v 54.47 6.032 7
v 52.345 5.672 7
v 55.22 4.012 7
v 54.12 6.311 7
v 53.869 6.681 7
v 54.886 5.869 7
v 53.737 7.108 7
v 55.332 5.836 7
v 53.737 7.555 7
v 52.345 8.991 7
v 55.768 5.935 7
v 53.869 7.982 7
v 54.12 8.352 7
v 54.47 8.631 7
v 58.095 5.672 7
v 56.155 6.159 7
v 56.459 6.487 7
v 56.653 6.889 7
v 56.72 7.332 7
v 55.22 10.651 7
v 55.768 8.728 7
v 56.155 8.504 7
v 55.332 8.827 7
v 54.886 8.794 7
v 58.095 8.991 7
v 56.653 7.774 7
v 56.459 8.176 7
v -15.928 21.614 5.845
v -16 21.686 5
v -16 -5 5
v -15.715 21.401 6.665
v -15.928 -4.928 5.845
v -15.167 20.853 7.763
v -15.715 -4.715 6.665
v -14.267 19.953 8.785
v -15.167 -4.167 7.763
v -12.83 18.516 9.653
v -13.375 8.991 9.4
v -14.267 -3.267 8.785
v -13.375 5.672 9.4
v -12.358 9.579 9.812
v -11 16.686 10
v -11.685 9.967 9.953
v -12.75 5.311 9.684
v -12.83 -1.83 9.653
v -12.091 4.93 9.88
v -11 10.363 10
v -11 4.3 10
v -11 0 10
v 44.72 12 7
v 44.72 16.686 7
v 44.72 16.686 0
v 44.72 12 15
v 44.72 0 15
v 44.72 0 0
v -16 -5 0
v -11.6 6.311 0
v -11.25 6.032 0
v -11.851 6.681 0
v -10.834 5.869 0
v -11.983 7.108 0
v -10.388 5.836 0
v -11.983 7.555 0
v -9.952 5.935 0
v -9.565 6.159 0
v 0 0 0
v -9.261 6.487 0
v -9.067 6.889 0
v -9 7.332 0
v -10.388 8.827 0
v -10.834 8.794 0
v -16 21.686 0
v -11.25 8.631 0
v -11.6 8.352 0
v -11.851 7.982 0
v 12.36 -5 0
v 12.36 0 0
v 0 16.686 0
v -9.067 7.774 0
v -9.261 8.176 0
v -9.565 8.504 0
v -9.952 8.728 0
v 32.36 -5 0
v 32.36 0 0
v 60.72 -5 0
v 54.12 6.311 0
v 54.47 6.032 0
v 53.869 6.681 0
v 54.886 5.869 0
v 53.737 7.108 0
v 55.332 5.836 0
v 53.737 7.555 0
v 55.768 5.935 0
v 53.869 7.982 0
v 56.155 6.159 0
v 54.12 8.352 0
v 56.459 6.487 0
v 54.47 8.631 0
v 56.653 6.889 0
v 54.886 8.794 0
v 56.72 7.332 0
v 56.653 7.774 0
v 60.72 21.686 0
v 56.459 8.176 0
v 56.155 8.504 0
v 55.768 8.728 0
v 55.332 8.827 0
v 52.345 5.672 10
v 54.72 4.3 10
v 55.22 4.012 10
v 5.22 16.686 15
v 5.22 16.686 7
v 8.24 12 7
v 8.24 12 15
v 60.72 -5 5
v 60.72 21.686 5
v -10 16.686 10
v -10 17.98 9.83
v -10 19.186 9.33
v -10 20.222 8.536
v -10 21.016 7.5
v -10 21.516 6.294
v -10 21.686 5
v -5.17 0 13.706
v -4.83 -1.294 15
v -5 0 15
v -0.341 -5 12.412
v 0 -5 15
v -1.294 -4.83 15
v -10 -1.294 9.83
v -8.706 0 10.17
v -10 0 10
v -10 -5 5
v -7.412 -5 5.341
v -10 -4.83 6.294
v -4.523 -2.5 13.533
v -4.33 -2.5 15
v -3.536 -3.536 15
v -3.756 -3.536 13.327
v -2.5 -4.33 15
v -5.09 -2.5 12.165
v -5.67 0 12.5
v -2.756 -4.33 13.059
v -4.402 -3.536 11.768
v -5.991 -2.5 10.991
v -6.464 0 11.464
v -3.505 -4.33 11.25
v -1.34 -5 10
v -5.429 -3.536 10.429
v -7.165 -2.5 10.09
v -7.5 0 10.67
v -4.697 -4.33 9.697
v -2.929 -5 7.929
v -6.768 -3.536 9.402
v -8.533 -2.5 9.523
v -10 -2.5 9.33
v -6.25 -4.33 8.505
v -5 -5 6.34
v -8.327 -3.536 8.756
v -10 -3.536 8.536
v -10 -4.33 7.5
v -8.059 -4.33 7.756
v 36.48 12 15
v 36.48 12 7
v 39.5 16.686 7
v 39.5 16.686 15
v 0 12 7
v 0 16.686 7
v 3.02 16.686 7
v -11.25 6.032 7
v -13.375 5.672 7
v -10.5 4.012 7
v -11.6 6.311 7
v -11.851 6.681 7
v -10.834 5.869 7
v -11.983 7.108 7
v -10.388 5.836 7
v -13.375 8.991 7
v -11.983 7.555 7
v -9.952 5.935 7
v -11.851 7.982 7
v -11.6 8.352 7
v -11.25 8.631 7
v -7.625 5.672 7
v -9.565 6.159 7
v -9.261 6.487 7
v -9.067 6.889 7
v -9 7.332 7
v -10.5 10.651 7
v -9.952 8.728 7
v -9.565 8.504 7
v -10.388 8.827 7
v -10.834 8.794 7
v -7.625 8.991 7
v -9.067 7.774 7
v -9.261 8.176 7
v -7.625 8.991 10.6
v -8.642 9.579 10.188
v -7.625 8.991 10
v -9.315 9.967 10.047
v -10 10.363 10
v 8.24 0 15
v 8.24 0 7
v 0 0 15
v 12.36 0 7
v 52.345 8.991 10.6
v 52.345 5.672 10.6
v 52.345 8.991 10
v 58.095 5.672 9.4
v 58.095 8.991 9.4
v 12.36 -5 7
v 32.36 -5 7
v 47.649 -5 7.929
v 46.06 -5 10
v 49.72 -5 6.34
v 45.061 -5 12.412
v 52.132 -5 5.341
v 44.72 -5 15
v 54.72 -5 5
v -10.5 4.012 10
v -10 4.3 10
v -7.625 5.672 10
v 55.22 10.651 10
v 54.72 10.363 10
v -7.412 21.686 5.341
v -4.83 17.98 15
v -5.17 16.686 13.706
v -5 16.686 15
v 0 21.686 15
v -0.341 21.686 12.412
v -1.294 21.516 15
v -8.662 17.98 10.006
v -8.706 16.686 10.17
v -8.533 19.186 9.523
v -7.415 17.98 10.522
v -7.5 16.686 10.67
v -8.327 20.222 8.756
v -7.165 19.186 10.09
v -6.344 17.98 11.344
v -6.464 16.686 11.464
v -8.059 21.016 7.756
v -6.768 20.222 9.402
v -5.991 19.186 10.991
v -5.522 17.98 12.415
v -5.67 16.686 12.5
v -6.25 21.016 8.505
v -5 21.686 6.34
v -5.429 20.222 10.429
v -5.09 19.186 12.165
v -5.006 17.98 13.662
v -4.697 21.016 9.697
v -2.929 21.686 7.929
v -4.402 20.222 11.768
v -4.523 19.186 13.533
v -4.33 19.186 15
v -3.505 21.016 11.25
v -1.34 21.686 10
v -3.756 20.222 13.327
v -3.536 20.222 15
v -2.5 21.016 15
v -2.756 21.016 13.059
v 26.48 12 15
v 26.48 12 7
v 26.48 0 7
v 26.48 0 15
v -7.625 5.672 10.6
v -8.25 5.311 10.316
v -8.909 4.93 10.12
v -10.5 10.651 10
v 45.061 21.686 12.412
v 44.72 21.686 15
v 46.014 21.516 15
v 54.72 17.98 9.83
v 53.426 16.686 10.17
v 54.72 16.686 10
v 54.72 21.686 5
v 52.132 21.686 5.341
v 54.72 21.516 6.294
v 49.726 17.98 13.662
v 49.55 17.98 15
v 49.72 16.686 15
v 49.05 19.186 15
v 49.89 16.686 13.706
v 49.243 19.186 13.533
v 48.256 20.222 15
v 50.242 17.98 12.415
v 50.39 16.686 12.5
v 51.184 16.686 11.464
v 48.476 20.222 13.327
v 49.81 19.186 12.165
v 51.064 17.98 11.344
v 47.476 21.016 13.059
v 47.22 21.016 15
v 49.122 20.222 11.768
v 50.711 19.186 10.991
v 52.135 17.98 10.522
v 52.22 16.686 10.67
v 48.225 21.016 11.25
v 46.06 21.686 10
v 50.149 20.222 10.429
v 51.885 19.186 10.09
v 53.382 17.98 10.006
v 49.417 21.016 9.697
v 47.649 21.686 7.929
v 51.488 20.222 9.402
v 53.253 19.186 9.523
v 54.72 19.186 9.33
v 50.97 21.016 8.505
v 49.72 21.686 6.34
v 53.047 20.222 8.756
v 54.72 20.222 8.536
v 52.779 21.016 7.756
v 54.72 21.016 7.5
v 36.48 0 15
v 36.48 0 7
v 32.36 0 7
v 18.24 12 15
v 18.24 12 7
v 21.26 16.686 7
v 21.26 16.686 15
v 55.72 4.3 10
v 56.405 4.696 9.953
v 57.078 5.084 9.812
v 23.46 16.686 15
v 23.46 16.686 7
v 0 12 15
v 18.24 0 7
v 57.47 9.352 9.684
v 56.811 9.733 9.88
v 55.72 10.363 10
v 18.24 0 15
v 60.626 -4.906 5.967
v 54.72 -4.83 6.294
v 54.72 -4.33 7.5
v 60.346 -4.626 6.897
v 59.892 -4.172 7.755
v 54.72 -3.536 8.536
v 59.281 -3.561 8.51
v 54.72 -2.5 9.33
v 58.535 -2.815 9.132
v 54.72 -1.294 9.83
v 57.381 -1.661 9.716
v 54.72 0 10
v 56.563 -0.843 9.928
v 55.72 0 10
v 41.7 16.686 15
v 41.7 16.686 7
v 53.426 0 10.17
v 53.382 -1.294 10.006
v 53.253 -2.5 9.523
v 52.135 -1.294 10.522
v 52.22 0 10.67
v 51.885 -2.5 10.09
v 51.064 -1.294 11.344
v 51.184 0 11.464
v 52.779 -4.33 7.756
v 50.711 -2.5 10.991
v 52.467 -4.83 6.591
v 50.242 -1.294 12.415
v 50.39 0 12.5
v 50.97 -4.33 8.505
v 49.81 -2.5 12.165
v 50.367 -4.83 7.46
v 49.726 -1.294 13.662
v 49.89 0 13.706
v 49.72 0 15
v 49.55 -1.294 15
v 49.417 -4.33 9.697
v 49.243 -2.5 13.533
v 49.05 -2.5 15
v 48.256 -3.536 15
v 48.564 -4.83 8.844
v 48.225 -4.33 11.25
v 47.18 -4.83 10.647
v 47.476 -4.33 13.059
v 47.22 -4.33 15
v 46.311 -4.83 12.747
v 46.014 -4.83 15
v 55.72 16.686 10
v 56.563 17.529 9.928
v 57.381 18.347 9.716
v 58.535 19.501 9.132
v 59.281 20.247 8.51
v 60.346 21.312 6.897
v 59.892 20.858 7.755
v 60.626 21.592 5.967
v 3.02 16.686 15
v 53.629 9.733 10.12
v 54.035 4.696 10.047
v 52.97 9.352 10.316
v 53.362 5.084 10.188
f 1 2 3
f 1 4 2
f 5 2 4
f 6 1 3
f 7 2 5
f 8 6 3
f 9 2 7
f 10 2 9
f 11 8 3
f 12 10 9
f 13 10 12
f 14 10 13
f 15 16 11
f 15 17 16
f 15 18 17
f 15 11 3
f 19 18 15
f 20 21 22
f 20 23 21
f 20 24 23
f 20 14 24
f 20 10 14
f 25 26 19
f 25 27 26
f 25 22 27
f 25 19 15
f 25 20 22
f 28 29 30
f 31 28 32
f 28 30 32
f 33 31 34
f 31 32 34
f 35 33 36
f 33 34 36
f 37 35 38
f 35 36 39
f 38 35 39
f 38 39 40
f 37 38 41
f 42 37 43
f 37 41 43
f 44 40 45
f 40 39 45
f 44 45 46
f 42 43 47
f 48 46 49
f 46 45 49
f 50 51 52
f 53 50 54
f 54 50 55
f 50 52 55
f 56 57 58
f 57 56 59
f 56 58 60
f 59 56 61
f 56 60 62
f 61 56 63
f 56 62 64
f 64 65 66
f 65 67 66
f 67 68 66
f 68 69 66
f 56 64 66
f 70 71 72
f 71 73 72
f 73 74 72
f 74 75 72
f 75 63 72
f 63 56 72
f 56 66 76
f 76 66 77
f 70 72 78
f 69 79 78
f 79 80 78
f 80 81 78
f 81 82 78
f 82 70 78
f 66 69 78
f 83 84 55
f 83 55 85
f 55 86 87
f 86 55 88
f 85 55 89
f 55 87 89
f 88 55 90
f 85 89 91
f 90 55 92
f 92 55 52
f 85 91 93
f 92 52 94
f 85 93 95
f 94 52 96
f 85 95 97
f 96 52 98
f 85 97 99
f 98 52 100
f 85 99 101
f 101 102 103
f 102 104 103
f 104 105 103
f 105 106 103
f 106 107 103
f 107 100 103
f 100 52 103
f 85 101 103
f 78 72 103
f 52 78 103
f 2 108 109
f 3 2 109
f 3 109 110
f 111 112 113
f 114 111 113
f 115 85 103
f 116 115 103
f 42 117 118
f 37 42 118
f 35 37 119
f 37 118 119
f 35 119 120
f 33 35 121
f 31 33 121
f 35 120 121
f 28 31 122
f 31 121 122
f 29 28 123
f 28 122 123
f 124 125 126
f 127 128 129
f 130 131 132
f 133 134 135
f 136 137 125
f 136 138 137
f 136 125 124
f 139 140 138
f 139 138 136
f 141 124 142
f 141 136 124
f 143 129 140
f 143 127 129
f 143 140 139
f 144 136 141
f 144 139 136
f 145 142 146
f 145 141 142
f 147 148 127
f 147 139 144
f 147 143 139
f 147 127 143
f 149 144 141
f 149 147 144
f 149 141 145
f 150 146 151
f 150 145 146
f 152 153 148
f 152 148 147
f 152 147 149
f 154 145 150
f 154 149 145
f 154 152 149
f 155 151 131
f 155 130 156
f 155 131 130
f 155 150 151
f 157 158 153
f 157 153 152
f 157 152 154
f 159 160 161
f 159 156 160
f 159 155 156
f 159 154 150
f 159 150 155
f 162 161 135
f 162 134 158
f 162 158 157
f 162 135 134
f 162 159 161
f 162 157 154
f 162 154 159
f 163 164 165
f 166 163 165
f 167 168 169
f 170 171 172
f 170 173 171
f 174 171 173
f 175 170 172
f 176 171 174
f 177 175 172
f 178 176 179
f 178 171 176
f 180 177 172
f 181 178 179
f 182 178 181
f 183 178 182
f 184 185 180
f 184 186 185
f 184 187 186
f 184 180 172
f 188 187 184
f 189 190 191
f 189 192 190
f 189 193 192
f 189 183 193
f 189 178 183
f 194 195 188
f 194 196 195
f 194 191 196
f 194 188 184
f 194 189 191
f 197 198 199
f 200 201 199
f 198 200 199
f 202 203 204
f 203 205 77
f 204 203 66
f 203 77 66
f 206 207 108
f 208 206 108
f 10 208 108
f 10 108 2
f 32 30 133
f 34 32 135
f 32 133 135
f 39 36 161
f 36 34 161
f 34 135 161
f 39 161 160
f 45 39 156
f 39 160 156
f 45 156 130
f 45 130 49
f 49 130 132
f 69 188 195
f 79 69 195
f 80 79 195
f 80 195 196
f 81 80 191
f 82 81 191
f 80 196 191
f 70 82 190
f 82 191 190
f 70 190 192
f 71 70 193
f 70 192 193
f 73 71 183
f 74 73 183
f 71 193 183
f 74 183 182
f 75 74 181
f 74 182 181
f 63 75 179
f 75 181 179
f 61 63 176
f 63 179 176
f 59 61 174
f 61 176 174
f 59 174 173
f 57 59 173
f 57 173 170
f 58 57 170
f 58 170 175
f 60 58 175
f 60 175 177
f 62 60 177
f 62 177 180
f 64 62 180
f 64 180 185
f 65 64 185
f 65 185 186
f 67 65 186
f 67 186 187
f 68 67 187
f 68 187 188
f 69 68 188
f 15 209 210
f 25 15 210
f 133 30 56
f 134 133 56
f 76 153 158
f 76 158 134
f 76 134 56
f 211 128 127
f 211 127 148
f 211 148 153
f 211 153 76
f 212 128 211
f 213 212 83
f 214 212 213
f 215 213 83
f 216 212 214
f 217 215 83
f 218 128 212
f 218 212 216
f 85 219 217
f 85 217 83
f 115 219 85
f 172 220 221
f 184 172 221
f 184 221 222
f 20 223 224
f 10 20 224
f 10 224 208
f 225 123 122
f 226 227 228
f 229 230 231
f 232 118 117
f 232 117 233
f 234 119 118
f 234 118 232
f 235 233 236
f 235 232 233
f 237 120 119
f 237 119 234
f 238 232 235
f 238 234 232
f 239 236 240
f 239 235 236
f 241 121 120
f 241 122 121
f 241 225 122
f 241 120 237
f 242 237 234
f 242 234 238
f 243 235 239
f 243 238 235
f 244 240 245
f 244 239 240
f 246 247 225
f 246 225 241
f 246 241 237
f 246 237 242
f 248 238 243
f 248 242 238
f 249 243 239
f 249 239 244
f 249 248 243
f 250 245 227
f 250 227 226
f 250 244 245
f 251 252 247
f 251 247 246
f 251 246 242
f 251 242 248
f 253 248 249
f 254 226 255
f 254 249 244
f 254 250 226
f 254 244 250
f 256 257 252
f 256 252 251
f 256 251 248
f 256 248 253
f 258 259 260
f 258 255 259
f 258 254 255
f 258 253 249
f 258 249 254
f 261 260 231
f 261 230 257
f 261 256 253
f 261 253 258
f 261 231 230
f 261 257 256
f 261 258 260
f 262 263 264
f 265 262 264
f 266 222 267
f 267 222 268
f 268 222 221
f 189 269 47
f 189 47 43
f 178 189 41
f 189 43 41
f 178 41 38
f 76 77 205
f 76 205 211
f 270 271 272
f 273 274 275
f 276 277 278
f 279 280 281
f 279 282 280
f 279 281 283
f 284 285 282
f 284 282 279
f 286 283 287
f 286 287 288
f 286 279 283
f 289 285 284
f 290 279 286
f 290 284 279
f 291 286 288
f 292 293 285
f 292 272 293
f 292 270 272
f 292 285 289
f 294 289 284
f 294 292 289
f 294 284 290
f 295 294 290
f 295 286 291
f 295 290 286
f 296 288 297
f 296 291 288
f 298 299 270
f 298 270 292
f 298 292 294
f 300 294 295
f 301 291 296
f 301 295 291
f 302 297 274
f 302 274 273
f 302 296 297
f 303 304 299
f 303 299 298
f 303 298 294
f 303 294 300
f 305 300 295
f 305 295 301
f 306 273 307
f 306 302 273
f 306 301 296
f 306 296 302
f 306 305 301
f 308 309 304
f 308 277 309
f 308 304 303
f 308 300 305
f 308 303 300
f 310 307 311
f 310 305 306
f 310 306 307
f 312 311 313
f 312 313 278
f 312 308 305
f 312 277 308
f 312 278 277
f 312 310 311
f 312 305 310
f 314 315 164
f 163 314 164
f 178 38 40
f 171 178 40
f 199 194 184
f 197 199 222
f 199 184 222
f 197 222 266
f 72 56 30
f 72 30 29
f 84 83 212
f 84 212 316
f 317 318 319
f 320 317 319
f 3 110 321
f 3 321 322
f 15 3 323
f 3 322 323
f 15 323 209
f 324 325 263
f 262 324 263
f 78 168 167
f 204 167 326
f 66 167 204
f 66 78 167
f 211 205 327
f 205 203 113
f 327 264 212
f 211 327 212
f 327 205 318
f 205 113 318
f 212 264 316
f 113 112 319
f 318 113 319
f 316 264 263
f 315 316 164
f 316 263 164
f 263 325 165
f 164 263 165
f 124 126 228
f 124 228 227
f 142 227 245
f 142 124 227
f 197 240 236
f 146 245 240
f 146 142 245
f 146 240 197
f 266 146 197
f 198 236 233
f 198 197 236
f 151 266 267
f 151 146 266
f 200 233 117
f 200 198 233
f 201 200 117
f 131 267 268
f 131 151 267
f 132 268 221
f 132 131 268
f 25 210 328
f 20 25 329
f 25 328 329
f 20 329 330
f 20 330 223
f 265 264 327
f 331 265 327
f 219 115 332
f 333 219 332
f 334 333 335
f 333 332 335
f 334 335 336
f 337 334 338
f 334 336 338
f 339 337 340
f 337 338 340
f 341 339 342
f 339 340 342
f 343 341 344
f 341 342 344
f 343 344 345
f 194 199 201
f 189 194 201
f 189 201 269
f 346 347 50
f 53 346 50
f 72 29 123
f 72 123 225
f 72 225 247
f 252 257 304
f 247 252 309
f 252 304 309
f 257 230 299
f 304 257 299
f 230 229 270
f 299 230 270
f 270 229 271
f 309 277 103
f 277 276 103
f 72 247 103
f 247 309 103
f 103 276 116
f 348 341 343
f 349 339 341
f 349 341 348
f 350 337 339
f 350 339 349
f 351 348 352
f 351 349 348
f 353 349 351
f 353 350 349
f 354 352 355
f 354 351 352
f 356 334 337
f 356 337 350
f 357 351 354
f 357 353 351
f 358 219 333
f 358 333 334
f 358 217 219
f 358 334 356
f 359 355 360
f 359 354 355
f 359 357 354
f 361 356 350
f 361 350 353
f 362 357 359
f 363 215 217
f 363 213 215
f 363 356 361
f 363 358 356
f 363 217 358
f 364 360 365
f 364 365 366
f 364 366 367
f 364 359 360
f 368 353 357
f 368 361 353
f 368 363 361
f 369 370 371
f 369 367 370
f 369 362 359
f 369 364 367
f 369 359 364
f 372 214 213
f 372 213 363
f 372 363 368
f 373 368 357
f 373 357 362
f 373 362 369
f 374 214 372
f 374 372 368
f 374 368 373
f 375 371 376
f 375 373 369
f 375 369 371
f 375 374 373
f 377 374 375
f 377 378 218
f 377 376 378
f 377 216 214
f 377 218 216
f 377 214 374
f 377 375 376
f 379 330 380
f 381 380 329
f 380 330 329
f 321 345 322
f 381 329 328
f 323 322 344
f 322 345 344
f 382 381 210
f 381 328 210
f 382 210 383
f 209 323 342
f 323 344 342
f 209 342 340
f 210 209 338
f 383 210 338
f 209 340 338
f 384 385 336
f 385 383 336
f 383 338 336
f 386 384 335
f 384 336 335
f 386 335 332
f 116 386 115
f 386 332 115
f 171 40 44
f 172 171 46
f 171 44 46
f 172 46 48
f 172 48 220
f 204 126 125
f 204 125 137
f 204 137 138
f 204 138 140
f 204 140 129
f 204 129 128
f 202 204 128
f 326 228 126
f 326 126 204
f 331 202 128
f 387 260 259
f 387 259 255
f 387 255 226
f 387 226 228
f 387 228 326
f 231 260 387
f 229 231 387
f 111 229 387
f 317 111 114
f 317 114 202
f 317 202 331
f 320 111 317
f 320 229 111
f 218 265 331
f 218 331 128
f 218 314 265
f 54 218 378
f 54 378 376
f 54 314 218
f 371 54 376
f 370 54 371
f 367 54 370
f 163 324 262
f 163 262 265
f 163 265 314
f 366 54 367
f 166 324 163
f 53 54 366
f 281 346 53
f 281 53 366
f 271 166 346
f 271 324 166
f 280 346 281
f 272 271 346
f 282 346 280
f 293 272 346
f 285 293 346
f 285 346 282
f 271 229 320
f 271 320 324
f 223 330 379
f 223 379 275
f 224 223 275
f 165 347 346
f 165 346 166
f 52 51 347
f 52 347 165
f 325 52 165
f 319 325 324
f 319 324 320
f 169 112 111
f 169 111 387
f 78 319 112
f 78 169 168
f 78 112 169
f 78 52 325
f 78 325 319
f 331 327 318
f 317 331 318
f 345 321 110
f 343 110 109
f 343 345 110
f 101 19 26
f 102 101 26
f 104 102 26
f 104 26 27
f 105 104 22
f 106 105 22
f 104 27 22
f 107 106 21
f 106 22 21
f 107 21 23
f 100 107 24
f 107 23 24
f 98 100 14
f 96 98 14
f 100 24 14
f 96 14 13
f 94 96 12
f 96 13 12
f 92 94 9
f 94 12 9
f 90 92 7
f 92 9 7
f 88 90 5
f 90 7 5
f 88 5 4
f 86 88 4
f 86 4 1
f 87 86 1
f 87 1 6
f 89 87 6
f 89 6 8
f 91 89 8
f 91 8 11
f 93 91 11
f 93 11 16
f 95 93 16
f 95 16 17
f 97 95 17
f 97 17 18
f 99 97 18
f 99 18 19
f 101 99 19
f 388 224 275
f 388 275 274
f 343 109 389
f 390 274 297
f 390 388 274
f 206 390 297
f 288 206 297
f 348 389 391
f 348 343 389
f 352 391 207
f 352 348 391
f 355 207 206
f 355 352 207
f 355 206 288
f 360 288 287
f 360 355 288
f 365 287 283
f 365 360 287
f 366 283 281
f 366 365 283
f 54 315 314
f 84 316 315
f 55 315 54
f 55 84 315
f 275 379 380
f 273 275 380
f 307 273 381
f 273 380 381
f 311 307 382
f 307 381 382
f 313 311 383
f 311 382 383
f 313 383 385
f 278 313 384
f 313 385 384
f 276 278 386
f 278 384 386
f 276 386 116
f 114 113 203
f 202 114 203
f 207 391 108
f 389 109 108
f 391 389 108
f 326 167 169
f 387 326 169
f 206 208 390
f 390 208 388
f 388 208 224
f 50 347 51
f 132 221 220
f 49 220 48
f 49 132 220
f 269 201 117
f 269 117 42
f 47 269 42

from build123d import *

# Parameters (mm, degrees)
SKETCH1_W           = 76.72
SKETCH1_H           = 26.686
BOSS_EXTRUDE1_DEPTH = 15
SKETCH2_W           = 11
SKETCH2_H           = 5
CUT_EXTRUDE1_DEPTH  = 69.000448499
SKETCH3_R           = 1.5
CUT_EXTRUDE2_DEPTH  = 25
CUT_EXTRUDE3_DEPTH  = 3
CUT_EXTRUDE5_DEPTH  = 7
FILLET1_R           = 5


with BuildPart() as part:
    # Sketch1 → Boss-Extrude1 (new body)
    with BuildSketch(Plane.XY):
        with Locations((22.36, 8.343)):
            Rectangle(SKETCH1_W, SKETCH1_H)
        Polygon((0, 0), (0, 12), (3.02, 16.686), (5.22, 16.686), (8.24, 12), (8.24, 0), align=None, mode=Mode.SUBTRACT)
        Polygon((23.46, 16.686), (26.48, 12), (26.48, 0), (18.24, 0), (18.24, 12), (21.26, 16.686), align=None, mode=Mode.SUBTRACT)
        Polygon((41.7, 16.686), (44.72, 12), (44.72, 0), (36.48, 0), (36.48, 12), (39.5, 16.686), align=None, mode=Mode.SUBTRACT)
    extrude(amount=BOSS_EXTRUDE1_DEPTH)

    # Sketch2 → Cut-Extrude1 (cut, through all)
    with BuildSketch(Plane(origin=(0, -5, 0), x_dir=(-1, 0, 0), z_dir=(0, -1, 0))):
        with Locations((10.5, -12.5)):
            Rectangle(SKETCH2_W, SKETCH2_H)
        with Locations((-55.22, -12.5)):
            Rectangle(SKETCH2_W, SKETCH2_H)
    extrude(amount=-CUT_EXTRUDE1_DEPTH, mode=Mode.SUBTRACT)

    # Sketch3 → Cut-Extrude2 (cut)
    with BuildSketch(Plane.XY.offset(10)):
        with Locations((-10.5, 7.331502285)):
            Circle(SKETCH3_R)
        with Locations((55.22, 7.331502285)):
            Circle(SKETCH3_R)
    extrude(amount=-CUT_EXTRUDE2_DEPTH, mode=Mode.SUBTRACT)

    # Sketch4 → Cut-Extrude3 (cut)
    with BuildSketch(Plane.XY.offset(10)):
        Polygon((-10.5, 10.651266332), (-13.375, 8.991384309), (-13.375, 5.671620261), (-10.5, 4.011738237), (-7.625, 5.671620261), (-7.625, 8.991384309), align=None)
        Polygon((55.22, 10.651266332), (52.345, 8.991384309), (52.345, 5.671620261), (55.22, 4.011738237), (58.095, 5.671620261), (58.095, 8.991384309), align=None)
    extrude(amount=-CUT_EXTRUDE3_DEPTH, mode=Mode.SUBTRACT)

    # Sketch7 → Cut-Extrude5 (cut)
    with BuildSketch(Plane(origin=(0, 0, 0), x_dir=(-1, 0, 0), z_dir=(0, 0, -1))):
        Polygon((0, 0), (-12.36, 0), (-12.36, -5), (-32.36, -5), (-32.36, 0), (-44.72, 0), (-44.72, 16.686), (0, 16.686), align=None)
    extrude(amount=-CUT_EXTRUDE5_DEPTH, mode=Mode.SUBTRACT)

    # Fillet1
    # the kernel refuses this fillet: 5 mm, written as the material it adds along each edge
    with BuildSketch(Plane(origin=(49.72, -5, 10), x_dir=(0, 0, 1), z_dir=(0, 1, 0))) as fillet1_piece_1_section:
        with BuildLine():
            CenterArc((FILLET1_R, FILLET1_R), FILLET1_R, 180, 90)
            Line((0, FILLET1_R), (0, 0))
            Line((0, 0), (FILLET1_R, 0))
        make_face()
    fillet1_piece_1 = extrude(amount=26.686, mode=Mode.PRIVATE)
    fillet1_piece_1 = split(fillet1_piece_1, bisect_by=Plane(origin=(52.345, 0.855809372, 11.280904263), z_dir=(-1, 0, 0)), keep=Keep.TOP, mode=Mode.PRIVATE)
    fillet1_piece_1 = split(fillet1_piece_1, bisect_by=Plane(origin=(53.079309625, 5.247666401, 11.280904263), z_dir=(-0.5000000000000012, -0.866025403784438, 0)), keep=Keep.TOP, mode=Mode.PRIVATE)
    add(fillet1_piece_1)
    with BuildSketch(Plane(origin=(49.72, -5, 10), x_dir=(0, 0, 1), z_dir=(0, 1, 0))) as fillet1_piece_2_section:
        with BuildLine():
            CenterArc((FILLET1_R, FILLET1_R), FILLET1_R, 180, 90)
            Line((0, FILLET1_R), (0, 0))
            Line((0, 0), (FILLET1_R, 0))
        make_face()
    fillet1_piece_2 = extrude(amount=26.686, mode=Mode.PRIVATE)
    fillet1_piece_2 = split(fillet1_piece_2, bisect_by=Plane(origin=(52.345, 0.113882783, 10.103766802), z_dir=(1, 0, 0)), keep=Keep.TOP, mode=Mode.PRIVATE)
    fillet1_piece_2 = split(fillet1_piece_2, bisect_by=Plane(origin=(55.328155085, 3.94929487, 10.103766802), z_dir=(-0.5000000000000012, -0.866025403784438, 0)), keep=Keep.TOP, mode=Mode.PRIVATE)
    add(fillet1_piece_2)
    with BuildSketch(Plane(origin=(49.72, -5, 10), x_dir=(0, 0, 1), z_dir=(0, 1, 0))) as fillet1_piece_3_section:
        with BuildLine():
            CenterArc((FILLET1_R, FILLET1_R), FILLET1_R, 180, 90)
            Line((0, FILLET1_R), (0, 0))
            Line((0, 0), (FILLET1_R, 0))
        make_face()
    fillet1_piece_3 = extrude(amount=26.686, mode=Mode.PRIVATE)
    fillet1_piece_3 = split(fillet1_piece_3, bisect_by=Plane(origin=(50.660222367, 8.018677488, 10.86123456), z_dir=(0.5000000000000002, -0.8660254037844386, 0)), keep=Keep.TOP, mode=Mode.PRIVATE)
    fillet1_piece_3 = split(fillet1_piece_3, bisect_by=Plane(origin=(52.345, 7.331502285, 10.86123456), z_dir=(-1, 0, 0)), keep=Keep.TOP, mode=Mode.PRIVATE)
    fillet1_piece_3 = split(fillet1_piece_3, bisect_by=Plane(origin=(50.660222367, 6.644327081, 10.86123456), z_dir=(0.5000000000000012, 0.866025403784438, 0)), keep=Keep.TOP, mode=Mode.PRIVATE)
    add(fillet1_piece_3)
    with BuildSketch(Plane(origin=(49.72, -5, 10), x_dir=(0, 0, 1), z_dir=(0, 1, 0))) as fillet1_piece_4_section:
        with BuildLine():
            CenterArc((FILLET1_R, FILLET1_R), FILLET1_R, 180, 90)
            Line((0, FILLET1_R), (0, 0))
            Line((0, 0), (FILLET1_R, 0))
        make_face()
    fillet1_piece_4 = extrude(amount=26.686, mode=Mode.PRIVATE)
    fillet1_piece_4 = split(fillet1_piece_4, bisect_by=Plane(origin=(53.520712077, 9.670181993, 11.277716929), z_dir=(-0.5000000000000002, 0.8660254037844386, 0)), keep=Keep.TOP, mode=Mode.PRIVATE)
    fillet1_piece_4 = split(fillet1_piece_4, bisect_by=Plane(origin=(52.345, 14.819818281, 11.277716929), z_dir=(-1, 0, 0)), keep=Keep.TOP, mode=Mode.PRIVATE)
    add(fillet1_piece_4)
    with BuildSketch(Plane(origin=(49.72, -5, 10), x_dir=(0, 0, 1), z_dir=(0, 1, 0))) as fillet1_piece_5_section:
        with BuildLine():
            CenterArc((FILLET1_R, FILLET1_R), FILLET1_R, 180, 90)
            Line((0, FILLET1_R), (0, 0))
            Line((0, 0), (FILLET1_R, 0))
        make_face()
    fillet1_piece_5 = extrude(amount=26.686, mode=Mode.PRIVATE)
    fillet1_piece_5 = split(fillet1_piece_5, bisect_by=Plane(origin=(55.769242126, 10.968371422, 10.103260702), z_dir=(-0.5000000000000002, 0.8660254037844386, 0)), keep=Keep.TOP, mode=Mode.PRIVATE)
    fillet1_piece_5 = split(fillet1_piece_5, bisect_by=Plane(origin=(52.345, 15.561640812, 10.103260702), z_dir=(1, 0, 0)), keep=Keep.TOP, mode=Mode.PRIVATE)
    add(fillet1_piece_5)
    with BuildSketch(Plane(origin=(-5, -5, 10), x_dir=(-1, 0, 0), z_dir=(0, 1, 0))) as fillet1_piece_6_section:
        with BuildLine():
            CenterArc((FILLET1_R, FILLET1_R), FILLET1_R, 180, 90)
            Line((0, FILLET1_R), (0, 0))
            Line((0, 0), (FILLET1_R, 0))
        make_face()
    fillet1_piece_6 = extrude(amount=26.686, mode=Mode.PRIVATE)
    fillet1_piece_6 = split(fillet1_piece_6, bisect_by=Plane(origin=(-10.608155085, 3.94929487, 10.103766802), z_dir=(0.5000000000000003, -0.8660254037844387, 0)), keep=Keep.TOP, mode=Mode.PRIVATE)
    fillet1_piece_6 = split(fillet1_piece_6, bisect_by=Plane(origin=(-7.625, 0.113882783, 10.103766802), z_dir=(-1, 0, 0)), keep=Keep.TOP, mode=Mode.PRIVATE)
    add(fillet1_piece_6)
    with BuildSketch(Plane(origin=(-5, -5, 10), x_dir=(-1, 0, 0), z_dir=(0, 1, 0))) as fillet1_piece_7_section:
        with BuildLine():
            CenterArc((FILLET1_R, FILLET1_R), FILLET1_R, 180, 90)
            Line((0, FILLET1_R), (0, 0))
            Line((0, 0), (FILLET1_R, 0))
        make_face()
    fillet1_piece_7 = extrude(amount=26.686, mode=Mode.PRIVATE)
    fillet1_piece_7 = split(fillet1_piece_7, bisect_by=Plane(origin=(-8.359309625, 5.247666401, 11.280904263), z_dir=(0.5000000000000003, -0.8660254037844387, 0)), keep=Keep.TOP, mode=Mode.PRIVATE)
    fillet1_piece_7 = split(fillet1_piece_7, bisect_by=Plane(origin=(-7.625, 0.855809372, 11.280904263), z_dir=(1, 0, 0)), keep=Keep.TOP, mode=Mode.PRIVATE)
    add(fillet1_piece_7)
    with BuildSketch(Plane(origin=(-5, -5, 10), x_dir=(-1, 0, 0), z_dir=(0, 1, 0))) as fillet1_piece_8_section:
        with BuildLine():
            CenterArc((FILLET1_R, FILLET1_R), FILLET1_R, 180, 90)
            Line((0, FILLET1_R), (0, 0))
            Line((0, 0), (FILLET1_R, 0))
        make_face()
    fillet1_piece_8 = extrude(amount=26.686, mode=Mode.PRIVATE)
    fillet1_piece_8 = split(fillet1_piece_8, bisect_by=Plane(origin=(-5.940222366, 6.644327081, 10.861234561), z_dir=(-0.5000000000000003, 0.8660254037844387, 0)), keep=Keep.TOP, mode=Mode.PRIVATE)
    fillet1_piece_8 = split(fillet1_piece_8, bisect_by=Plane(origin=(-7.625, 7.331502285, 10.861234561), z_dir=(1, 0, 0)), keep=Keep.TOP, mode=Mode.PRIVATE)
    fillet1_piece_8 = split(fillet1_piece_8, bisect_by=Plane(origin=(-5.940222366, 8.018677488, 10.861234561), z_dir=(-0.49999999999999967, -0.8660254037844388, 0)), keep=Keep.TOP, mode=Mode.PRIVATE)
    add(fillet1_piece_8)
    with BuildSketch(Plane(origin=(-5, -5, 10), x_dir=(-1, 0, 0), z_dir=(0, 1, 0))) as fillet1_piece_9_section:
        with BuildLine():
            CenterArc((FILLET1_R, FILLET1_R), FILLET1_R, 180, 90)
            Line((0, FILLET1_R), (0, 0))
            Line((0, 0), (FILLET1_R, 0))
        make_face()
    fillet1_piece_9 = extrude(amount=26.686, mode=Mode.PRIVATE)
    fillet1_piece_9 = split(fillet1_piece_9, bisect_by=Plane(origin=(-7.625, 15.561640812, 10.103260702), z_dir=(-1, 0, 0)), keep=Keep.TOP, mode=Mode.PRIVATE)
    fillet1_piece_9 = split(fillet1_piece_9, bisect_by=Plane(origin=(-11.049242126, 10.968371422, 10.103260702), z_dir=(0.49999999999999967, 0.8660254037844388, 0)), keep=Keep.TOP, mode=Mode.PRIVATE)
    add(fillet1_piece_9)
    with BuildSketch(Plane(origin=(-5, -5, 10), x_dir=(-1, 0, 0), z_dir=(0, 1, 0))) as fillet1_piece_10_section:
        with BuildLine():
            CenterArc((FILLET1_R, FILLET1_R), FILLET1_R, 180, 90)
            Line((0, FILLET1_R), (0, 0))
            Line((0, 0), (FILLET1_R, 0))
        make_face()
    fillet1_piece_10 = extrude(amount=26.686, mode=Mode.PRIVATE)
    fillet1_piece_10 = split(fillet1_piece_10, bisect_by=Plane(origin=(-7.625, 14.819818281, 11.277716929), z_dir=(1, 0, 0)), keep=Keep.TOP, mode=Mode.PRIVATE)
    fillet1_piece_10 = split(fillet1_piece_10, bisect_by=Plane(origin=(-8.800712077, 9.670181993, 11.277716929), z_dir=(0.49999999999999967, 0.8660254037844388, 0)), keep=Keep.TOP, mode=Mode.PRIVATE)
    add(fillet1_piece_10)
    # the kernel refuses this fillet: 5 mm, written as the material it takes off along each edge
    with BuildSketch(Plane(origin=(60.72, -17.5, 10), x_dir=(0, 0, -1), z_dir=(0, 1, 0)), Plane(origin=(-16, -17.5, 10), x_dir=(1, 0, 0), z_dir=(0, 1, 0))) as fillet1_2_piece_1:
        with BuildLine():
            CenterArc((FILLET1_R, FILLET1_R), FILLET1_R, 180, 90)
            Line((0, FILLET1_R), (0, 0))
            Line((0, 0), (FILLET1_R, 0))
        make_face()
    extrude(amount=51.686, mode=Mode.SUBTRACT)
    with BuildSketch(Plane(origin=(73.22, 21.686, 10), x_dir=(0, 0, -1), z_dir=(-1, 0, 0)), Plane(origin=(-10, 21.686, 10), x_dir=(0, 0, -1), z_dir=(-1, 0, 0))) as fillet1_2_piece_2:
        with BuildLine():
            CenterArc((FILLET1_R, FILLET1_R), FILLET1_R, 180, 90)
            Line((0, FILLET1_R), (0, 0))
            Line((0, 0), (FILLET1_R, 0))
        make_face()
    extrude(amount=18.5, mode=Mode.SUBTRACT)
    with BuildSketch(Plane(origin=(73.22, -5, 10), x_dir=(0, 0, -1), z_dir=(-1, 0, 0)), Plane(origin=(-10, -5, 10), x_dir=(0, 0, -1), z_dir=(-1, 0, 0))) as fillet1_2_piece_3:
        with BuildLine():
            CenterArc((FILLET1_R, -FILLET1_R), FILLET1_R, 90, 90)
            Line((0, -FILLET1_R), (0, 0))
            Line((0, 0), (FILLET1_R, 0))
        make_face()
    extrude(amount=18.5, mode=Mode.SUBTRACT)
    with BuildSketch(Plane(origin=(-10, -5, 15), x_dir=(-0.8017442392976459, 0, 0.5976672776328307), z_dir=(-0.5976672776328307, 0, -0.8017442392976459))) as fillet1_2_piece_4:
        with BuildLine():
            CenterArc((5 + FILLET1_R, FILLET1_R), FILLET1_R, 180, 90)
            Line((5, FILLET1_R), (5, 0))
            Line((5, 0), (5 + FILLET1_R, 0))
        make_face()
    revolve(axis=Axis((-10, -5, 15), (0, 1, 0)), revolution_arc=233.296989237, mode=Mode.SUBTRACT)
    with BuildSketch(Plane(origin=(-10, 21.686, 15), x_dir=(0, 0, -1), z_dir=(-1, 0, 0))) as fillet1_2_piece_5:
        with BuildLine():
            CenterArc((5 + FILLET1_R, FILLET1_R), FILLET1_R, 180, 90)
            Line((5, FILLET1_R), (5, 0))
            Line((5, 0), (5 + FILLET1_R, 0))
        make_face()
    revolve(axis=Axis((-10, 21.686, 15), (0, -1, 0)), revolution_arc=233.296989237, mode=Mode.SUBTRACT)
    with BuildSketch(Plane(origin=(54.72, -5, 15), x_dir=(0, 0, -1), z_dir=(1, 0, 0))) as fillet1_2_piece_6:
        with BuildLine():
            CenterArc((5 + FILLET1_R, FILLET1_R), FILLET1_R, 180, 90)
            Line((5, FILLET1_R), (5, 0))
            Line((5, 0), (5 + FILLET1_R, 0))
        make_face()
    revolve(axis=Axis((54.72, -5, 15), (0, 1, 0)), revolution_arc=233.296989237, mode=Mode.SUBTRACT)
    with BuildSketch(Plane(origin=(54.72, 21.686, 15), x_dir=(0.8017442392976476, 0, 0.5976672776328285), z_dir=(0.5976672776328285, 0, -0.8017442392976476))) as fillet1_2_piece_7:
        with BuildLine():
            CenterArc((5 + FILLET1_R, FILLET1_R), FILLET1_R, 180, 90)
            Line((5, FILLET1_R), (5, 0))
            Line((5, 0), (5 + FILLET1_R, 0))
        make_face()
    revolve(axis=Axis((54.72, 21.686, 15), (0, -1, 0)), revolution_arc=233.296989237, mode=Mode.SUBTRACT)


solid = part.part
